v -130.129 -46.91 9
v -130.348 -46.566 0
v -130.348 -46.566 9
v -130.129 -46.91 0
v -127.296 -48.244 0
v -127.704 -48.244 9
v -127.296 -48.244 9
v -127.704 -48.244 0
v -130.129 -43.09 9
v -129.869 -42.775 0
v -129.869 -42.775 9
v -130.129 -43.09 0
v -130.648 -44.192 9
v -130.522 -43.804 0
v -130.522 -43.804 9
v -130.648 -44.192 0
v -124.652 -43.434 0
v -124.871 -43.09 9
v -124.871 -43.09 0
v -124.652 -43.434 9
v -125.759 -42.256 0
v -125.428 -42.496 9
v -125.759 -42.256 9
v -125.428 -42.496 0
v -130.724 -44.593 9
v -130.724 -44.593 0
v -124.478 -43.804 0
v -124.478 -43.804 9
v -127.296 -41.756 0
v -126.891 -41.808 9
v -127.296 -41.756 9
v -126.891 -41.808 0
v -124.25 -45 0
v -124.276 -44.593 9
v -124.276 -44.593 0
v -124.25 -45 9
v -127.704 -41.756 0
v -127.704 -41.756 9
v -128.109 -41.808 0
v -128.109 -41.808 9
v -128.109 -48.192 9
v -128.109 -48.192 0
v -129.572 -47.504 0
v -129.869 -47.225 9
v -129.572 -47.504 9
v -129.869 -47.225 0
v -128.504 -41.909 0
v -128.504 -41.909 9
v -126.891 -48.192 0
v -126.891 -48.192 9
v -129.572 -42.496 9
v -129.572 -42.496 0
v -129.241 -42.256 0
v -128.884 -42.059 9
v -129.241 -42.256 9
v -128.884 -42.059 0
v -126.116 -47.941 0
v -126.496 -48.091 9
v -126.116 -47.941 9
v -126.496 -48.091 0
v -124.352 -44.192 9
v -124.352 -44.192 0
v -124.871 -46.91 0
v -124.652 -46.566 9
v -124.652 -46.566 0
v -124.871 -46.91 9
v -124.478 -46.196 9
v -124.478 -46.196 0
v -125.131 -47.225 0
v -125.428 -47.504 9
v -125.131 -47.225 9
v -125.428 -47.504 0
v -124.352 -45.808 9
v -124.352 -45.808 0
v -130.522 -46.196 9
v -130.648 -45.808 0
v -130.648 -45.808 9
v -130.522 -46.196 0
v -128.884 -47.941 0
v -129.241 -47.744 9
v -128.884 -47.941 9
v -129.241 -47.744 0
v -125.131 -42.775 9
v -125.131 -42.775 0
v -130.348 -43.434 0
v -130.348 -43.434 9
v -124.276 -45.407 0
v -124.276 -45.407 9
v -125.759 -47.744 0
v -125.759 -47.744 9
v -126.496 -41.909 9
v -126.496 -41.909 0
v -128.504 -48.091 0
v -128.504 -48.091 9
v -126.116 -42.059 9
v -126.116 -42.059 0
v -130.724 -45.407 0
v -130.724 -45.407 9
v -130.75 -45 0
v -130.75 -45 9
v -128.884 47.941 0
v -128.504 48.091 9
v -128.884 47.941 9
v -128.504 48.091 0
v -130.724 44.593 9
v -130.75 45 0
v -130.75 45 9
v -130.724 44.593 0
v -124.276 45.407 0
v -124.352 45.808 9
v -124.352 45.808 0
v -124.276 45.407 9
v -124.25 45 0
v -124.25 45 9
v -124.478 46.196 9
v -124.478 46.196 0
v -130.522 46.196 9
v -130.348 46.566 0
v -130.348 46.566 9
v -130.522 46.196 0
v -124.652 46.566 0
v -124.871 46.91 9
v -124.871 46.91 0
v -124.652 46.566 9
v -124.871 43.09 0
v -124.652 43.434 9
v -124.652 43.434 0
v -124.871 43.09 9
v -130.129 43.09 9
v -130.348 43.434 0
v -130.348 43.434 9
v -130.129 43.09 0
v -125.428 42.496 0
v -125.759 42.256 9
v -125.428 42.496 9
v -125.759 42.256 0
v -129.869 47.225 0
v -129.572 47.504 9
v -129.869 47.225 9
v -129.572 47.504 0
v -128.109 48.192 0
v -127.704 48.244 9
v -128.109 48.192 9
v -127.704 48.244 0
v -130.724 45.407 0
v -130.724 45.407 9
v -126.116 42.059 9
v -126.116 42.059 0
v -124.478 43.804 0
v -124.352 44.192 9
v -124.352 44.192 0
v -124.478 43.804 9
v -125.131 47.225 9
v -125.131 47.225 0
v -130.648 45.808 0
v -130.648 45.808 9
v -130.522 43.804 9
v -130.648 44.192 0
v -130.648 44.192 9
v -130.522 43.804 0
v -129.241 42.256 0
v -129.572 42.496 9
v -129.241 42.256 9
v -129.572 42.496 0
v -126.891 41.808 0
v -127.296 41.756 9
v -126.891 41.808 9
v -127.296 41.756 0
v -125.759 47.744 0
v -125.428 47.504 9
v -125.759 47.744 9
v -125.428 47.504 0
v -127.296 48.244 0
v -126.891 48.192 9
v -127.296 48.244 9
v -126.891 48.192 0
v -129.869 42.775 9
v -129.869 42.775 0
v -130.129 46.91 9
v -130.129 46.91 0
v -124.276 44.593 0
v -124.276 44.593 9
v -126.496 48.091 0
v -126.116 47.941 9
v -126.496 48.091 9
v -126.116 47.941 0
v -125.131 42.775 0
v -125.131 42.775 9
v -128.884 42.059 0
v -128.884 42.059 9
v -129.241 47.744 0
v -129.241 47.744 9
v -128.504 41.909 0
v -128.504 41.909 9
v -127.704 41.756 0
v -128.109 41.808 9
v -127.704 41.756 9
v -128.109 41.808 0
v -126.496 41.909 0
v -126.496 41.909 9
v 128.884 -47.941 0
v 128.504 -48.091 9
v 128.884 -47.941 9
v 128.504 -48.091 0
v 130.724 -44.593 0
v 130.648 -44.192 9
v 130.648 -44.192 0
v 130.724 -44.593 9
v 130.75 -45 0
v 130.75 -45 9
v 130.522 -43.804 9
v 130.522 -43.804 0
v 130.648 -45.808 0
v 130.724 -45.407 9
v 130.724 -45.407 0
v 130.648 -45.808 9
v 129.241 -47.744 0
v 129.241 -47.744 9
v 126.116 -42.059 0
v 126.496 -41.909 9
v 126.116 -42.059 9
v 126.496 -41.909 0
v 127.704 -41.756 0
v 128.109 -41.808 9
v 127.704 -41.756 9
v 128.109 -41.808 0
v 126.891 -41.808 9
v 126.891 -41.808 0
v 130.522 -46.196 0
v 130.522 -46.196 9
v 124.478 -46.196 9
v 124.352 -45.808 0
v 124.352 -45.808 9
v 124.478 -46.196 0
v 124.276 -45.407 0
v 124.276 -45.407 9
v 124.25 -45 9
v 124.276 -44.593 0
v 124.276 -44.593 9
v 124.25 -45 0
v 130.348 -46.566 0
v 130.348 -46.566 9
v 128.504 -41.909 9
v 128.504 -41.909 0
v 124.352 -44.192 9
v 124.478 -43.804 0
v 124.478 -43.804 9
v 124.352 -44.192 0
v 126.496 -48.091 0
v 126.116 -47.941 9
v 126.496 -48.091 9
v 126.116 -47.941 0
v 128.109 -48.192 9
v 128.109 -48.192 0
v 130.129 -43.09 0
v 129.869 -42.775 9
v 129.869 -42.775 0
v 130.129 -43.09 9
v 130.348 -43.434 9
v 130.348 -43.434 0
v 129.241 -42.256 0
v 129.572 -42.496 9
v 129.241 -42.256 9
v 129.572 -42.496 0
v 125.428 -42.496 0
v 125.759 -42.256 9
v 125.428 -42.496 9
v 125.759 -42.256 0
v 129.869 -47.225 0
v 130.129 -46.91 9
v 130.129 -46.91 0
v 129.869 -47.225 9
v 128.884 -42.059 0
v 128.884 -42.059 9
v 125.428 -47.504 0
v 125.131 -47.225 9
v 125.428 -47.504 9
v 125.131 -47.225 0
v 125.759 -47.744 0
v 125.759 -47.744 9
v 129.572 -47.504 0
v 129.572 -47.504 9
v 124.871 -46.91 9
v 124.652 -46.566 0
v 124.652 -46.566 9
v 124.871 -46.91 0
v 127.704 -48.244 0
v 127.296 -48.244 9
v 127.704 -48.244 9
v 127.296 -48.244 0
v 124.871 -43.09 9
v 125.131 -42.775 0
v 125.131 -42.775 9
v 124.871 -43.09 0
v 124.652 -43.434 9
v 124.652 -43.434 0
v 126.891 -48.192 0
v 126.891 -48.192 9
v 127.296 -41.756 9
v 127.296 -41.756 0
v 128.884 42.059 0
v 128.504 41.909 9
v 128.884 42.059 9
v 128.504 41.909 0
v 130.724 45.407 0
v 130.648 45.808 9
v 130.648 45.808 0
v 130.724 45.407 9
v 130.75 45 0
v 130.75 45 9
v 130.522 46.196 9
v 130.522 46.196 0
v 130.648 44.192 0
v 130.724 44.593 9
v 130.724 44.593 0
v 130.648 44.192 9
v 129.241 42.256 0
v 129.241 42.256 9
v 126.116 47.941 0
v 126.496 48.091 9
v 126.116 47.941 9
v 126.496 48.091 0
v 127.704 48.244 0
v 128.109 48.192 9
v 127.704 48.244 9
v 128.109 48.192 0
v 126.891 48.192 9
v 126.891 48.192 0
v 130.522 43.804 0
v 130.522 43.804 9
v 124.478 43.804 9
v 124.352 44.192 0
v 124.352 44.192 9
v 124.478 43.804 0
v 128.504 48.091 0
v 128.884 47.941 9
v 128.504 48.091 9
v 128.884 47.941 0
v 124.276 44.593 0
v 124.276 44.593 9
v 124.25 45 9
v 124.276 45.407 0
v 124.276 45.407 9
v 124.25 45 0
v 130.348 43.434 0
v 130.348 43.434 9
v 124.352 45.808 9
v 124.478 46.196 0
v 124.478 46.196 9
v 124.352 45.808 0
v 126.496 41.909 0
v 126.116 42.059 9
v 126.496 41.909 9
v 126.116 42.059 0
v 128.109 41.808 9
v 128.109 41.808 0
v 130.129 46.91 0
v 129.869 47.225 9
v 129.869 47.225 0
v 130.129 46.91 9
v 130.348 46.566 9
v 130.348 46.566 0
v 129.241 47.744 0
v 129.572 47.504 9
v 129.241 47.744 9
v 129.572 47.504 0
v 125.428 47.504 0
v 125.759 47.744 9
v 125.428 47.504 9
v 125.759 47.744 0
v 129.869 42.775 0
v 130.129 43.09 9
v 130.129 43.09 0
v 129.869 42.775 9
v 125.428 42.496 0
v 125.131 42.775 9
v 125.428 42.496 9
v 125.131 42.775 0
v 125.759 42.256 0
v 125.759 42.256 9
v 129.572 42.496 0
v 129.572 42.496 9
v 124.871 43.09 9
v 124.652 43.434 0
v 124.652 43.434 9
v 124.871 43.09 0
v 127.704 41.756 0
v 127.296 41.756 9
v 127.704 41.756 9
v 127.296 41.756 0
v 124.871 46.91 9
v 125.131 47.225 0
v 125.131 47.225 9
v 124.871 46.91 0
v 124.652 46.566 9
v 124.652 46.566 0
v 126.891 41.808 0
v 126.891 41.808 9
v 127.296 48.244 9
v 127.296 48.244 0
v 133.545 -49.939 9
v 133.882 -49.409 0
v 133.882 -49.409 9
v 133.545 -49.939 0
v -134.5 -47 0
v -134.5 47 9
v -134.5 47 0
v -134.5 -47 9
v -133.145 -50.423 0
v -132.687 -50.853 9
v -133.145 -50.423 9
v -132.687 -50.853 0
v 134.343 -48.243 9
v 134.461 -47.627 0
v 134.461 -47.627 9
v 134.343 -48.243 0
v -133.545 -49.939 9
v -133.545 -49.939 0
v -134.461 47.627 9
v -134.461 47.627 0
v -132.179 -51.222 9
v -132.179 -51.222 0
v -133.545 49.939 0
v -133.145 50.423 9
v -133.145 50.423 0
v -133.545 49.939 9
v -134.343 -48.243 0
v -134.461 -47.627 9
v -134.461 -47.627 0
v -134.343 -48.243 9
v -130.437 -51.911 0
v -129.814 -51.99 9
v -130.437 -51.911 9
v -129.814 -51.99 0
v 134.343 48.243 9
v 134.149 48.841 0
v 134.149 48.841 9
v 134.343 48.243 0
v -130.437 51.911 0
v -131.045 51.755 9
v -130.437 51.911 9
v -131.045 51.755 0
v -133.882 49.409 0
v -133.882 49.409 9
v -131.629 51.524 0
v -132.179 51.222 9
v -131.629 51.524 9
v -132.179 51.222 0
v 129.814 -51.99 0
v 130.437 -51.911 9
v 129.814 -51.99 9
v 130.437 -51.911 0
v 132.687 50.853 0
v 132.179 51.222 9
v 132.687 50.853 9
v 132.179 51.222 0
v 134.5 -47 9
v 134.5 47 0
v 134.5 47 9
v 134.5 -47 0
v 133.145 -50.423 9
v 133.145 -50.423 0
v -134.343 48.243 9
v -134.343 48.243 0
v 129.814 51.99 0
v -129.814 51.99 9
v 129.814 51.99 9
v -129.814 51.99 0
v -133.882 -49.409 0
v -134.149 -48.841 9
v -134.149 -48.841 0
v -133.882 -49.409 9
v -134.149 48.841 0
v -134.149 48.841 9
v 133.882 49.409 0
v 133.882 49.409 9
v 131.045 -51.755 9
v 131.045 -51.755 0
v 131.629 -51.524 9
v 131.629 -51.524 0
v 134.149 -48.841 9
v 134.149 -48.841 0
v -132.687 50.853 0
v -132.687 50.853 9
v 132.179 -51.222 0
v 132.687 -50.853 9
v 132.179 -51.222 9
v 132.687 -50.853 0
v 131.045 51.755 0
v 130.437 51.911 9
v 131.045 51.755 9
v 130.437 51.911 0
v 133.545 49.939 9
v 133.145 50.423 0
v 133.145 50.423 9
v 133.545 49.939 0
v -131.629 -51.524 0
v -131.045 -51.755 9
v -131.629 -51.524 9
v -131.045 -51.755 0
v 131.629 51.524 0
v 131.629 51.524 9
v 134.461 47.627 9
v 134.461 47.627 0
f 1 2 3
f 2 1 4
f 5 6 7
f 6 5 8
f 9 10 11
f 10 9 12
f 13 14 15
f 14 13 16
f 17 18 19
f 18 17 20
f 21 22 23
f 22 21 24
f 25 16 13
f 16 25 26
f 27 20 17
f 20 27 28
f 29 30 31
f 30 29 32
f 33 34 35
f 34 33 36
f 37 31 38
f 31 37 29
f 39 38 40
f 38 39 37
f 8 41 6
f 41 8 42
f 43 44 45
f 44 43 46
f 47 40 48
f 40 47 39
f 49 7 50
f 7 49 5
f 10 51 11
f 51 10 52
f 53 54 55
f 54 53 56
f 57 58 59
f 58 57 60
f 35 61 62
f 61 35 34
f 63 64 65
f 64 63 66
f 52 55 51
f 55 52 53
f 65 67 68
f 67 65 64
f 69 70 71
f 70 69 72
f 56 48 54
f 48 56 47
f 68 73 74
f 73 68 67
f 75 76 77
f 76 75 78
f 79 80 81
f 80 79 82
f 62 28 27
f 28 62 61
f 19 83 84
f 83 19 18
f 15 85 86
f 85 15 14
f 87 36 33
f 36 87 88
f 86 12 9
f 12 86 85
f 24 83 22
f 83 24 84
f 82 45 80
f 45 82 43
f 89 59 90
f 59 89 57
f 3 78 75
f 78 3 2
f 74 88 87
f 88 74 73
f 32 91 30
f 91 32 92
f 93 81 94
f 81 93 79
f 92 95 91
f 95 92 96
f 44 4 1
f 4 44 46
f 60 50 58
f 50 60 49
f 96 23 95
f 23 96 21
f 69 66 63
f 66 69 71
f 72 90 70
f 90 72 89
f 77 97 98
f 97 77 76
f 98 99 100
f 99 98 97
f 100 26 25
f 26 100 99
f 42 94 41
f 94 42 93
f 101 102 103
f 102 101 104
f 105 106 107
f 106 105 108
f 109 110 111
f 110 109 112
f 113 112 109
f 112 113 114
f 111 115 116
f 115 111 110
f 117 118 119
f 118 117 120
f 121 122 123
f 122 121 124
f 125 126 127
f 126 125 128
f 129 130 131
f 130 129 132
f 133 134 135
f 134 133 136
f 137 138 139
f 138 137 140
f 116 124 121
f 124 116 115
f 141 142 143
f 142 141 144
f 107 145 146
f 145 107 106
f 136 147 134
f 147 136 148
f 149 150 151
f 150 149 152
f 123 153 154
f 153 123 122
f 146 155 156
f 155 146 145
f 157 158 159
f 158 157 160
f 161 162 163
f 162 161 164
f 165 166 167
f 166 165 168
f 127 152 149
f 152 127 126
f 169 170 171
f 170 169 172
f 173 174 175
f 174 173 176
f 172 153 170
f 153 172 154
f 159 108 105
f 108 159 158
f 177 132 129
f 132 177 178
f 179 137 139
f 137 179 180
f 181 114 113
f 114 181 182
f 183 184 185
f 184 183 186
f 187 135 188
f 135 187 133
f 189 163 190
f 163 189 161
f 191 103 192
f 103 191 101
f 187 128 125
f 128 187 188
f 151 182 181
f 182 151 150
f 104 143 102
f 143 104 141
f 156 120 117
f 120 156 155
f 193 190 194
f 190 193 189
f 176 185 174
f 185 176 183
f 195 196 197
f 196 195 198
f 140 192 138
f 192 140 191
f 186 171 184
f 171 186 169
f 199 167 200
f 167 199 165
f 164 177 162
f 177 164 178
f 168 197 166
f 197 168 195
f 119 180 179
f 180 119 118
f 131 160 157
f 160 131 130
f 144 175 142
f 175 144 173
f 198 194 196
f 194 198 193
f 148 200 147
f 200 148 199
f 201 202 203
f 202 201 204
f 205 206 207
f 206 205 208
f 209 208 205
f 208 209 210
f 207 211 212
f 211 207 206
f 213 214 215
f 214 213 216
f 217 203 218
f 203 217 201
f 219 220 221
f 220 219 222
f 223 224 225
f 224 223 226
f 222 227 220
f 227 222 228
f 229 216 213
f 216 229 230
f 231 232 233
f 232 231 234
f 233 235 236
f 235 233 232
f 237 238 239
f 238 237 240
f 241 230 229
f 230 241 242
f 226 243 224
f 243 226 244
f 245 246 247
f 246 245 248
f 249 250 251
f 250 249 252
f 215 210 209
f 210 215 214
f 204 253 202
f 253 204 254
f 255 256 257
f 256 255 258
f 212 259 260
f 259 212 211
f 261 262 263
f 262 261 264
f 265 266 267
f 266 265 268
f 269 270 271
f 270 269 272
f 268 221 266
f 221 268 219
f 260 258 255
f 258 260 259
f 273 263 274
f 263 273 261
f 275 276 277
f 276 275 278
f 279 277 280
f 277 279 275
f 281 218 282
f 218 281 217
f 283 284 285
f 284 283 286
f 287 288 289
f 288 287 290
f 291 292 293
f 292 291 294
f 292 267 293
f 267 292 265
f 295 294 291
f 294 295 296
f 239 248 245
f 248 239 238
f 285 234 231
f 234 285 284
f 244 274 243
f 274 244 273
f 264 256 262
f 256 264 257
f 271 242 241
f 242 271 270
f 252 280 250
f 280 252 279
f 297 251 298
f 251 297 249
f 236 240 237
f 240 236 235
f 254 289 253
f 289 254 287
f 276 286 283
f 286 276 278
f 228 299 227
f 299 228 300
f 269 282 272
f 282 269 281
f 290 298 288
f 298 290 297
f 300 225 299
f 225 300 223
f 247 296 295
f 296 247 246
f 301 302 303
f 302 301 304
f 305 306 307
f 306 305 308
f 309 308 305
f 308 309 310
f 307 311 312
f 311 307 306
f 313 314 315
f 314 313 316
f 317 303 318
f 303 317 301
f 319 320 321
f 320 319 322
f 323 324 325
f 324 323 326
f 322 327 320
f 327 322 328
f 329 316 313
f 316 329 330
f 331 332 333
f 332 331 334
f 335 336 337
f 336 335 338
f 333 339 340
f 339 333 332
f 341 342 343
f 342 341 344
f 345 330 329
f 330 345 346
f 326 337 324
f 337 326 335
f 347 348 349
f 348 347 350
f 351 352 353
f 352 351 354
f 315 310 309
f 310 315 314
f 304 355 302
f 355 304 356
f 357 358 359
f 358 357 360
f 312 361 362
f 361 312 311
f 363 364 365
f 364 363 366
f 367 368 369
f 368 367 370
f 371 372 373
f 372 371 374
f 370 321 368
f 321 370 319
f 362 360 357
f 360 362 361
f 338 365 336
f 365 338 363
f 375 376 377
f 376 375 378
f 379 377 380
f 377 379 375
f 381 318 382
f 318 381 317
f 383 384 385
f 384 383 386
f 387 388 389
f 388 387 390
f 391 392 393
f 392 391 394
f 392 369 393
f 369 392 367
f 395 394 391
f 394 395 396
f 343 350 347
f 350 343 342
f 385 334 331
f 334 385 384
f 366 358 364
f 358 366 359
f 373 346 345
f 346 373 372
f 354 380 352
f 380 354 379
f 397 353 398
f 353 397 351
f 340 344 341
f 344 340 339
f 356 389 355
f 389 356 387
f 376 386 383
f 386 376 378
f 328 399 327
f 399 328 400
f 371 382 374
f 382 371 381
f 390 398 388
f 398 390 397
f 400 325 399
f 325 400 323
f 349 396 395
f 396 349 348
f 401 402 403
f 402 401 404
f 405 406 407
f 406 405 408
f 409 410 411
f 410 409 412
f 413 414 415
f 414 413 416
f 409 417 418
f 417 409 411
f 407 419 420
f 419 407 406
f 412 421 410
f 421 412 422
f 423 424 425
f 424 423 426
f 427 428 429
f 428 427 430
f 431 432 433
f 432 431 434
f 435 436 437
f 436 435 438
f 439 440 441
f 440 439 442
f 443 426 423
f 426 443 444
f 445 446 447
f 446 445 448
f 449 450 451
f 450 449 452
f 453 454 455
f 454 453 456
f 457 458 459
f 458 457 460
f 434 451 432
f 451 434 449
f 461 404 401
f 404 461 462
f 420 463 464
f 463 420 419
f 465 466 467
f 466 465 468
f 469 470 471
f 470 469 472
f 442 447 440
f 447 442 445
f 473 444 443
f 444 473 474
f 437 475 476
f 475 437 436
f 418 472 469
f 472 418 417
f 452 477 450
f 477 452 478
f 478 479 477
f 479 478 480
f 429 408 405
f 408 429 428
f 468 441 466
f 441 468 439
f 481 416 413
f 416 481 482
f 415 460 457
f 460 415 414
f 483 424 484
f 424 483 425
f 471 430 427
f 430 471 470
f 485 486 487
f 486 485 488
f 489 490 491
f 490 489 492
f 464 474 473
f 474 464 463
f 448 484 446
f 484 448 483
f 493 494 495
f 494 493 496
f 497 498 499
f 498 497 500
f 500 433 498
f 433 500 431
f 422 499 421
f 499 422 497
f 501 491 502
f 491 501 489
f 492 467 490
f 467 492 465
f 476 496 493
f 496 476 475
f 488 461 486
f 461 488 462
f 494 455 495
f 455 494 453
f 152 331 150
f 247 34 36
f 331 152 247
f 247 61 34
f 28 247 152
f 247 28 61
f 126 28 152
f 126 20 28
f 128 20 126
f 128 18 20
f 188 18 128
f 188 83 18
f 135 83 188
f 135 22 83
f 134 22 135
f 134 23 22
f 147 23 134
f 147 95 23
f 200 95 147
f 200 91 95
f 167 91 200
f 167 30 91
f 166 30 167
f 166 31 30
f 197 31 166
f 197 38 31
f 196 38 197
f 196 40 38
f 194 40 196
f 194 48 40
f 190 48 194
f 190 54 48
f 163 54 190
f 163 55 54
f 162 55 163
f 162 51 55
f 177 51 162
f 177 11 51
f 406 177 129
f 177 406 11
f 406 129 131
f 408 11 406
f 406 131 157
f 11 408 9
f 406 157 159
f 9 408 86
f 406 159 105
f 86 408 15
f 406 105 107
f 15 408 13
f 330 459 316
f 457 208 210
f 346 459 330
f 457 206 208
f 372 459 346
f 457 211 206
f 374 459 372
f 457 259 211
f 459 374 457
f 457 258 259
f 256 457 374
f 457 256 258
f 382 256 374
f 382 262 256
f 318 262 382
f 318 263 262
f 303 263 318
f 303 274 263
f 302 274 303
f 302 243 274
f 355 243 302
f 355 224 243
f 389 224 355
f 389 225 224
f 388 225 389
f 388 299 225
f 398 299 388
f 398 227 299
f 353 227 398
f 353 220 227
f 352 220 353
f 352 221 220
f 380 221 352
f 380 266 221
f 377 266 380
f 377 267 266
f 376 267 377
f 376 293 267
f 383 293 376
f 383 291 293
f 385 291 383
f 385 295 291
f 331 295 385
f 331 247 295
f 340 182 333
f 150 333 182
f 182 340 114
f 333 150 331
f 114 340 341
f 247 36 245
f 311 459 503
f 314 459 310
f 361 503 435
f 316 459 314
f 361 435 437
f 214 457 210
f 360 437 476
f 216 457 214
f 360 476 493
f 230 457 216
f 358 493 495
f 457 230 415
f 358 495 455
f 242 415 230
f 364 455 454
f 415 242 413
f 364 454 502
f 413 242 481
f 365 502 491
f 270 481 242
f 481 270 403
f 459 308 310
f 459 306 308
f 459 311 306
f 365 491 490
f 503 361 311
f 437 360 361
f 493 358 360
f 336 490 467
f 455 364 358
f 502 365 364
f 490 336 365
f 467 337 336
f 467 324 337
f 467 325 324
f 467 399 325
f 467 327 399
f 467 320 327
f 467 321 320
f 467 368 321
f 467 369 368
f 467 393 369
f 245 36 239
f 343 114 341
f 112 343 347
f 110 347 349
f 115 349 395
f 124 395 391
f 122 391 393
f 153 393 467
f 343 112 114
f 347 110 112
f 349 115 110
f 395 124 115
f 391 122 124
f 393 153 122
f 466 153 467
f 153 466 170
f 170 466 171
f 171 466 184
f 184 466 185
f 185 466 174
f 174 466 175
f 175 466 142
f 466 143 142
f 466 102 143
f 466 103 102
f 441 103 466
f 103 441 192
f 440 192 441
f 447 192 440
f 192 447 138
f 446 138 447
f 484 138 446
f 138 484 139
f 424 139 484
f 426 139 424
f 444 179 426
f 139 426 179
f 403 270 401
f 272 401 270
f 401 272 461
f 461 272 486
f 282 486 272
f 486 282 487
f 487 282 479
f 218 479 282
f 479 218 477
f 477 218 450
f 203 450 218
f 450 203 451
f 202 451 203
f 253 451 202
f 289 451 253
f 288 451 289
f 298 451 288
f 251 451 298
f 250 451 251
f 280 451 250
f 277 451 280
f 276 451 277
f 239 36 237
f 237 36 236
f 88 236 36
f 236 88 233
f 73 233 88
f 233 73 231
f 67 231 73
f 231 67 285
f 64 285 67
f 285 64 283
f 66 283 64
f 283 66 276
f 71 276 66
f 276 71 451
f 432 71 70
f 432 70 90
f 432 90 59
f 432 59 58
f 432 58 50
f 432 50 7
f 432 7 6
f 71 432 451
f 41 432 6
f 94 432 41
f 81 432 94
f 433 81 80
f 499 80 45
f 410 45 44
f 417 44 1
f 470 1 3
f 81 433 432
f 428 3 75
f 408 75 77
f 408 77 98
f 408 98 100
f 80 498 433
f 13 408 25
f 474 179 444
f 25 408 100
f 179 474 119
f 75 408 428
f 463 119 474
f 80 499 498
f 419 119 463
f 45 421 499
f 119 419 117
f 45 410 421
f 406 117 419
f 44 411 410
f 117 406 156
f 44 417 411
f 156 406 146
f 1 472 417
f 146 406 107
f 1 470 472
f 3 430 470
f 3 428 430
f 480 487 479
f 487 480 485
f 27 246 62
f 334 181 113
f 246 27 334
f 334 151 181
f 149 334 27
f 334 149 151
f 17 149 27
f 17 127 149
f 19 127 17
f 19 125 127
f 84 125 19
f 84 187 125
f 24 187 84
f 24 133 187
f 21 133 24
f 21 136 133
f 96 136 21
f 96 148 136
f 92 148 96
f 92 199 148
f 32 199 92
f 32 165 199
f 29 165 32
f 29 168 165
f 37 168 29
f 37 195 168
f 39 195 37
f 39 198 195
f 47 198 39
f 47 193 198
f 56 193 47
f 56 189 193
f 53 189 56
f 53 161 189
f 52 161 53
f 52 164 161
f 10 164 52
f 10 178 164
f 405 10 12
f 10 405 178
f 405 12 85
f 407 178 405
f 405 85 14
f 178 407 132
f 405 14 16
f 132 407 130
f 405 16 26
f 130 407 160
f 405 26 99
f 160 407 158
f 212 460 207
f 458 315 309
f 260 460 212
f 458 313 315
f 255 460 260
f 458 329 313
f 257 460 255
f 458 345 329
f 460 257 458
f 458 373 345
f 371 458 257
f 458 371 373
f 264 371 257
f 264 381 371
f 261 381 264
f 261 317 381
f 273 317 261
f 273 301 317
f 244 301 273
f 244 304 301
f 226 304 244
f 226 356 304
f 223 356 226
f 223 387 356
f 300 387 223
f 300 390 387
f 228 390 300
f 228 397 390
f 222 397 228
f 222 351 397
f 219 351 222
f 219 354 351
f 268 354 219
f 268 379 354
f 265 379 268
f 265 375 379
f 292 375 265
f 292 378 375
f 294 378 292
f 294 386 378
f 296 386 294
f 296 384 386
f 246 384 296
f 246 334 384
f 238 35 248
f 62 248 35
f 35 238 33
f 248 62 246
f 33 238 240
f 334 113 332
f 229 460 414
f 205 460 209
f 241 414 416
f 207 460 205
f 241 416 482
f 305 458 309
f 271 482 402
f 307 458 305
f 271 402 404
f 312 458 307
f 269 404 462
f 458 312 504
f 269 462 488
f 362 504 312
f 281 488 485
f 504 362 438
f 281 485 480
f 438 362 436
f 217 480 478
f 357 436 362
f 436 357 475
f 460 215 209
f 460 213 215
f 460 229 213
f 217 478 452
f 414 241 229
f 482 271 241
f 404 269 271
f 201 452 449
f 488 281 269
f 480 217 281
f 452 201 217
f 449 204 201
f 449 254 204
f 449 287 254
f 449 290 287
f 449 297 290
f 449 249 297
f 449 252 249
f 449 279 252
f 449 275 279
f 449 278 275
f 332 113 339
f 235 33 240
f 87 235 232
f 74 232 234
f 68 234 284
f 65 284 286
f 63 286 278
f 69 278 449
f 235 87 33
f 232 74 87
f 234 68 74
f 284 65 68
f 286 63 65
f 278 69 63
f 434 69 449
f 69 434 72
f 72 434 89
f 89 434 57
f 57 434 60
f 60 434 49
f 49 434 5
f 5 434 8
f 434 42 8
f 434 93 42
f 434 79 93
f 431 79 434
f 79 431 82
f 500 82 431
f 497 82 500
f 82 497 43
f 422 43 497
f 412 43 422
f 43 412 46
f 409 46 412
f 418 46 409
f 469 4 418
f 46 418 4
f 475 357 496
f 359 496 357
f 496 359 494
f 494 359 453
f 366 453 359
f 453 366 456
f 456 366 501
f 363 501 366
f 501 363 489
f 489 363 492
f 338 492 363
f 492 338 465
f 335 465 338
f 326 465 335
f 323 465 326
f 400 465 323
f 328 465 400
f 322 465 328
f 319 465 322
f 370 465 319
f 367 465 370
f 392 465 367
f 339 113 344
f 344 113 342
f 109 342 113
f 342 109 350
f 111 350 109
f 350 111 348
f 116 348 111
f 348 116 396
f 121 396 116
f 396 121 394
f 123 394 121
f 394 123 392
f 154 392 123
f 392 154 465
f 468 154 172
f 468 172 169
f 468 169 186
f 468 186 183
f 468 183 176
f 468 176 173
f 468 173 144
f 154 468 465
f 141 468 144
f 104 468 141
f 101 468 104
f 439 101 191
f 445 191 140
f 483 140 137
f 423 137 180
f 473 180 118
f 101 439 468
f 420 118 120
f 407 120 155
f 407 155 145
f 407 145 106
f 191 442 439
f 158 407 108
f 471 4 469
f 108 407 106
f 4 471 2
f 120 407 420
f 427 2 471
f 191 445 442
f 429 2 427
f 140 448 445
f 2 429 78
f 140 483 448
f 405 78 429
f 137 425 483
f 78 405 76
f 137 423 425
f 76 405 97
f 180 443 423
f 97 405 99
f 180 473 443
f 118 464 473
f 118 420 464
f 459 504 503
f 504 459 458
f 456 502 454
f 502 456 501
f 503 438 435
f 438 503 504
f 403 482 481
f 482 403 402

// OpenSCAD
$fn = 50;


difference() {
	union() {
		hull() {
			translate(v = [-129.5000000000, 47.0000000000, 0]) {
				cylinder(h = 9, r = 5);
			}
			translate(v = [129.5000000000, 47.0000000000, 0]) {
				cylinder(h = 9, r = 5);
			}
			translate(v = [-129.5000000000, -47.0000000000, 0]) {
				cylinder(h = 9, r = 5);
			}
			translate(v = [129.5000000000, -47.0000000000, 0]) {
				cylinder(h = 9, r = 5);
			}
		}
	}
	union() {
		translate(v = [-127.5000000000, -45.0000000000, -100.0000000000]) {
			cylinder(h = 200, r = 3.2500000000);
		}
		translate(v = [-127.5000000000, 45.0000000000, -100.0000000000]) {
			cylinder(h = 200, r = 3.2500000000);
		}
		translate(v = [127.5000000000, -45.0000000000, -100.0000000000]) {
			cylinder(h = 200, r = 3.2500000000);
		}
		translate(v = [127.5000000000, 45.0000000000, -100.0000000000]) {
			cylinder(h = 200, r = 3.2500000000);
		}
	}
}
